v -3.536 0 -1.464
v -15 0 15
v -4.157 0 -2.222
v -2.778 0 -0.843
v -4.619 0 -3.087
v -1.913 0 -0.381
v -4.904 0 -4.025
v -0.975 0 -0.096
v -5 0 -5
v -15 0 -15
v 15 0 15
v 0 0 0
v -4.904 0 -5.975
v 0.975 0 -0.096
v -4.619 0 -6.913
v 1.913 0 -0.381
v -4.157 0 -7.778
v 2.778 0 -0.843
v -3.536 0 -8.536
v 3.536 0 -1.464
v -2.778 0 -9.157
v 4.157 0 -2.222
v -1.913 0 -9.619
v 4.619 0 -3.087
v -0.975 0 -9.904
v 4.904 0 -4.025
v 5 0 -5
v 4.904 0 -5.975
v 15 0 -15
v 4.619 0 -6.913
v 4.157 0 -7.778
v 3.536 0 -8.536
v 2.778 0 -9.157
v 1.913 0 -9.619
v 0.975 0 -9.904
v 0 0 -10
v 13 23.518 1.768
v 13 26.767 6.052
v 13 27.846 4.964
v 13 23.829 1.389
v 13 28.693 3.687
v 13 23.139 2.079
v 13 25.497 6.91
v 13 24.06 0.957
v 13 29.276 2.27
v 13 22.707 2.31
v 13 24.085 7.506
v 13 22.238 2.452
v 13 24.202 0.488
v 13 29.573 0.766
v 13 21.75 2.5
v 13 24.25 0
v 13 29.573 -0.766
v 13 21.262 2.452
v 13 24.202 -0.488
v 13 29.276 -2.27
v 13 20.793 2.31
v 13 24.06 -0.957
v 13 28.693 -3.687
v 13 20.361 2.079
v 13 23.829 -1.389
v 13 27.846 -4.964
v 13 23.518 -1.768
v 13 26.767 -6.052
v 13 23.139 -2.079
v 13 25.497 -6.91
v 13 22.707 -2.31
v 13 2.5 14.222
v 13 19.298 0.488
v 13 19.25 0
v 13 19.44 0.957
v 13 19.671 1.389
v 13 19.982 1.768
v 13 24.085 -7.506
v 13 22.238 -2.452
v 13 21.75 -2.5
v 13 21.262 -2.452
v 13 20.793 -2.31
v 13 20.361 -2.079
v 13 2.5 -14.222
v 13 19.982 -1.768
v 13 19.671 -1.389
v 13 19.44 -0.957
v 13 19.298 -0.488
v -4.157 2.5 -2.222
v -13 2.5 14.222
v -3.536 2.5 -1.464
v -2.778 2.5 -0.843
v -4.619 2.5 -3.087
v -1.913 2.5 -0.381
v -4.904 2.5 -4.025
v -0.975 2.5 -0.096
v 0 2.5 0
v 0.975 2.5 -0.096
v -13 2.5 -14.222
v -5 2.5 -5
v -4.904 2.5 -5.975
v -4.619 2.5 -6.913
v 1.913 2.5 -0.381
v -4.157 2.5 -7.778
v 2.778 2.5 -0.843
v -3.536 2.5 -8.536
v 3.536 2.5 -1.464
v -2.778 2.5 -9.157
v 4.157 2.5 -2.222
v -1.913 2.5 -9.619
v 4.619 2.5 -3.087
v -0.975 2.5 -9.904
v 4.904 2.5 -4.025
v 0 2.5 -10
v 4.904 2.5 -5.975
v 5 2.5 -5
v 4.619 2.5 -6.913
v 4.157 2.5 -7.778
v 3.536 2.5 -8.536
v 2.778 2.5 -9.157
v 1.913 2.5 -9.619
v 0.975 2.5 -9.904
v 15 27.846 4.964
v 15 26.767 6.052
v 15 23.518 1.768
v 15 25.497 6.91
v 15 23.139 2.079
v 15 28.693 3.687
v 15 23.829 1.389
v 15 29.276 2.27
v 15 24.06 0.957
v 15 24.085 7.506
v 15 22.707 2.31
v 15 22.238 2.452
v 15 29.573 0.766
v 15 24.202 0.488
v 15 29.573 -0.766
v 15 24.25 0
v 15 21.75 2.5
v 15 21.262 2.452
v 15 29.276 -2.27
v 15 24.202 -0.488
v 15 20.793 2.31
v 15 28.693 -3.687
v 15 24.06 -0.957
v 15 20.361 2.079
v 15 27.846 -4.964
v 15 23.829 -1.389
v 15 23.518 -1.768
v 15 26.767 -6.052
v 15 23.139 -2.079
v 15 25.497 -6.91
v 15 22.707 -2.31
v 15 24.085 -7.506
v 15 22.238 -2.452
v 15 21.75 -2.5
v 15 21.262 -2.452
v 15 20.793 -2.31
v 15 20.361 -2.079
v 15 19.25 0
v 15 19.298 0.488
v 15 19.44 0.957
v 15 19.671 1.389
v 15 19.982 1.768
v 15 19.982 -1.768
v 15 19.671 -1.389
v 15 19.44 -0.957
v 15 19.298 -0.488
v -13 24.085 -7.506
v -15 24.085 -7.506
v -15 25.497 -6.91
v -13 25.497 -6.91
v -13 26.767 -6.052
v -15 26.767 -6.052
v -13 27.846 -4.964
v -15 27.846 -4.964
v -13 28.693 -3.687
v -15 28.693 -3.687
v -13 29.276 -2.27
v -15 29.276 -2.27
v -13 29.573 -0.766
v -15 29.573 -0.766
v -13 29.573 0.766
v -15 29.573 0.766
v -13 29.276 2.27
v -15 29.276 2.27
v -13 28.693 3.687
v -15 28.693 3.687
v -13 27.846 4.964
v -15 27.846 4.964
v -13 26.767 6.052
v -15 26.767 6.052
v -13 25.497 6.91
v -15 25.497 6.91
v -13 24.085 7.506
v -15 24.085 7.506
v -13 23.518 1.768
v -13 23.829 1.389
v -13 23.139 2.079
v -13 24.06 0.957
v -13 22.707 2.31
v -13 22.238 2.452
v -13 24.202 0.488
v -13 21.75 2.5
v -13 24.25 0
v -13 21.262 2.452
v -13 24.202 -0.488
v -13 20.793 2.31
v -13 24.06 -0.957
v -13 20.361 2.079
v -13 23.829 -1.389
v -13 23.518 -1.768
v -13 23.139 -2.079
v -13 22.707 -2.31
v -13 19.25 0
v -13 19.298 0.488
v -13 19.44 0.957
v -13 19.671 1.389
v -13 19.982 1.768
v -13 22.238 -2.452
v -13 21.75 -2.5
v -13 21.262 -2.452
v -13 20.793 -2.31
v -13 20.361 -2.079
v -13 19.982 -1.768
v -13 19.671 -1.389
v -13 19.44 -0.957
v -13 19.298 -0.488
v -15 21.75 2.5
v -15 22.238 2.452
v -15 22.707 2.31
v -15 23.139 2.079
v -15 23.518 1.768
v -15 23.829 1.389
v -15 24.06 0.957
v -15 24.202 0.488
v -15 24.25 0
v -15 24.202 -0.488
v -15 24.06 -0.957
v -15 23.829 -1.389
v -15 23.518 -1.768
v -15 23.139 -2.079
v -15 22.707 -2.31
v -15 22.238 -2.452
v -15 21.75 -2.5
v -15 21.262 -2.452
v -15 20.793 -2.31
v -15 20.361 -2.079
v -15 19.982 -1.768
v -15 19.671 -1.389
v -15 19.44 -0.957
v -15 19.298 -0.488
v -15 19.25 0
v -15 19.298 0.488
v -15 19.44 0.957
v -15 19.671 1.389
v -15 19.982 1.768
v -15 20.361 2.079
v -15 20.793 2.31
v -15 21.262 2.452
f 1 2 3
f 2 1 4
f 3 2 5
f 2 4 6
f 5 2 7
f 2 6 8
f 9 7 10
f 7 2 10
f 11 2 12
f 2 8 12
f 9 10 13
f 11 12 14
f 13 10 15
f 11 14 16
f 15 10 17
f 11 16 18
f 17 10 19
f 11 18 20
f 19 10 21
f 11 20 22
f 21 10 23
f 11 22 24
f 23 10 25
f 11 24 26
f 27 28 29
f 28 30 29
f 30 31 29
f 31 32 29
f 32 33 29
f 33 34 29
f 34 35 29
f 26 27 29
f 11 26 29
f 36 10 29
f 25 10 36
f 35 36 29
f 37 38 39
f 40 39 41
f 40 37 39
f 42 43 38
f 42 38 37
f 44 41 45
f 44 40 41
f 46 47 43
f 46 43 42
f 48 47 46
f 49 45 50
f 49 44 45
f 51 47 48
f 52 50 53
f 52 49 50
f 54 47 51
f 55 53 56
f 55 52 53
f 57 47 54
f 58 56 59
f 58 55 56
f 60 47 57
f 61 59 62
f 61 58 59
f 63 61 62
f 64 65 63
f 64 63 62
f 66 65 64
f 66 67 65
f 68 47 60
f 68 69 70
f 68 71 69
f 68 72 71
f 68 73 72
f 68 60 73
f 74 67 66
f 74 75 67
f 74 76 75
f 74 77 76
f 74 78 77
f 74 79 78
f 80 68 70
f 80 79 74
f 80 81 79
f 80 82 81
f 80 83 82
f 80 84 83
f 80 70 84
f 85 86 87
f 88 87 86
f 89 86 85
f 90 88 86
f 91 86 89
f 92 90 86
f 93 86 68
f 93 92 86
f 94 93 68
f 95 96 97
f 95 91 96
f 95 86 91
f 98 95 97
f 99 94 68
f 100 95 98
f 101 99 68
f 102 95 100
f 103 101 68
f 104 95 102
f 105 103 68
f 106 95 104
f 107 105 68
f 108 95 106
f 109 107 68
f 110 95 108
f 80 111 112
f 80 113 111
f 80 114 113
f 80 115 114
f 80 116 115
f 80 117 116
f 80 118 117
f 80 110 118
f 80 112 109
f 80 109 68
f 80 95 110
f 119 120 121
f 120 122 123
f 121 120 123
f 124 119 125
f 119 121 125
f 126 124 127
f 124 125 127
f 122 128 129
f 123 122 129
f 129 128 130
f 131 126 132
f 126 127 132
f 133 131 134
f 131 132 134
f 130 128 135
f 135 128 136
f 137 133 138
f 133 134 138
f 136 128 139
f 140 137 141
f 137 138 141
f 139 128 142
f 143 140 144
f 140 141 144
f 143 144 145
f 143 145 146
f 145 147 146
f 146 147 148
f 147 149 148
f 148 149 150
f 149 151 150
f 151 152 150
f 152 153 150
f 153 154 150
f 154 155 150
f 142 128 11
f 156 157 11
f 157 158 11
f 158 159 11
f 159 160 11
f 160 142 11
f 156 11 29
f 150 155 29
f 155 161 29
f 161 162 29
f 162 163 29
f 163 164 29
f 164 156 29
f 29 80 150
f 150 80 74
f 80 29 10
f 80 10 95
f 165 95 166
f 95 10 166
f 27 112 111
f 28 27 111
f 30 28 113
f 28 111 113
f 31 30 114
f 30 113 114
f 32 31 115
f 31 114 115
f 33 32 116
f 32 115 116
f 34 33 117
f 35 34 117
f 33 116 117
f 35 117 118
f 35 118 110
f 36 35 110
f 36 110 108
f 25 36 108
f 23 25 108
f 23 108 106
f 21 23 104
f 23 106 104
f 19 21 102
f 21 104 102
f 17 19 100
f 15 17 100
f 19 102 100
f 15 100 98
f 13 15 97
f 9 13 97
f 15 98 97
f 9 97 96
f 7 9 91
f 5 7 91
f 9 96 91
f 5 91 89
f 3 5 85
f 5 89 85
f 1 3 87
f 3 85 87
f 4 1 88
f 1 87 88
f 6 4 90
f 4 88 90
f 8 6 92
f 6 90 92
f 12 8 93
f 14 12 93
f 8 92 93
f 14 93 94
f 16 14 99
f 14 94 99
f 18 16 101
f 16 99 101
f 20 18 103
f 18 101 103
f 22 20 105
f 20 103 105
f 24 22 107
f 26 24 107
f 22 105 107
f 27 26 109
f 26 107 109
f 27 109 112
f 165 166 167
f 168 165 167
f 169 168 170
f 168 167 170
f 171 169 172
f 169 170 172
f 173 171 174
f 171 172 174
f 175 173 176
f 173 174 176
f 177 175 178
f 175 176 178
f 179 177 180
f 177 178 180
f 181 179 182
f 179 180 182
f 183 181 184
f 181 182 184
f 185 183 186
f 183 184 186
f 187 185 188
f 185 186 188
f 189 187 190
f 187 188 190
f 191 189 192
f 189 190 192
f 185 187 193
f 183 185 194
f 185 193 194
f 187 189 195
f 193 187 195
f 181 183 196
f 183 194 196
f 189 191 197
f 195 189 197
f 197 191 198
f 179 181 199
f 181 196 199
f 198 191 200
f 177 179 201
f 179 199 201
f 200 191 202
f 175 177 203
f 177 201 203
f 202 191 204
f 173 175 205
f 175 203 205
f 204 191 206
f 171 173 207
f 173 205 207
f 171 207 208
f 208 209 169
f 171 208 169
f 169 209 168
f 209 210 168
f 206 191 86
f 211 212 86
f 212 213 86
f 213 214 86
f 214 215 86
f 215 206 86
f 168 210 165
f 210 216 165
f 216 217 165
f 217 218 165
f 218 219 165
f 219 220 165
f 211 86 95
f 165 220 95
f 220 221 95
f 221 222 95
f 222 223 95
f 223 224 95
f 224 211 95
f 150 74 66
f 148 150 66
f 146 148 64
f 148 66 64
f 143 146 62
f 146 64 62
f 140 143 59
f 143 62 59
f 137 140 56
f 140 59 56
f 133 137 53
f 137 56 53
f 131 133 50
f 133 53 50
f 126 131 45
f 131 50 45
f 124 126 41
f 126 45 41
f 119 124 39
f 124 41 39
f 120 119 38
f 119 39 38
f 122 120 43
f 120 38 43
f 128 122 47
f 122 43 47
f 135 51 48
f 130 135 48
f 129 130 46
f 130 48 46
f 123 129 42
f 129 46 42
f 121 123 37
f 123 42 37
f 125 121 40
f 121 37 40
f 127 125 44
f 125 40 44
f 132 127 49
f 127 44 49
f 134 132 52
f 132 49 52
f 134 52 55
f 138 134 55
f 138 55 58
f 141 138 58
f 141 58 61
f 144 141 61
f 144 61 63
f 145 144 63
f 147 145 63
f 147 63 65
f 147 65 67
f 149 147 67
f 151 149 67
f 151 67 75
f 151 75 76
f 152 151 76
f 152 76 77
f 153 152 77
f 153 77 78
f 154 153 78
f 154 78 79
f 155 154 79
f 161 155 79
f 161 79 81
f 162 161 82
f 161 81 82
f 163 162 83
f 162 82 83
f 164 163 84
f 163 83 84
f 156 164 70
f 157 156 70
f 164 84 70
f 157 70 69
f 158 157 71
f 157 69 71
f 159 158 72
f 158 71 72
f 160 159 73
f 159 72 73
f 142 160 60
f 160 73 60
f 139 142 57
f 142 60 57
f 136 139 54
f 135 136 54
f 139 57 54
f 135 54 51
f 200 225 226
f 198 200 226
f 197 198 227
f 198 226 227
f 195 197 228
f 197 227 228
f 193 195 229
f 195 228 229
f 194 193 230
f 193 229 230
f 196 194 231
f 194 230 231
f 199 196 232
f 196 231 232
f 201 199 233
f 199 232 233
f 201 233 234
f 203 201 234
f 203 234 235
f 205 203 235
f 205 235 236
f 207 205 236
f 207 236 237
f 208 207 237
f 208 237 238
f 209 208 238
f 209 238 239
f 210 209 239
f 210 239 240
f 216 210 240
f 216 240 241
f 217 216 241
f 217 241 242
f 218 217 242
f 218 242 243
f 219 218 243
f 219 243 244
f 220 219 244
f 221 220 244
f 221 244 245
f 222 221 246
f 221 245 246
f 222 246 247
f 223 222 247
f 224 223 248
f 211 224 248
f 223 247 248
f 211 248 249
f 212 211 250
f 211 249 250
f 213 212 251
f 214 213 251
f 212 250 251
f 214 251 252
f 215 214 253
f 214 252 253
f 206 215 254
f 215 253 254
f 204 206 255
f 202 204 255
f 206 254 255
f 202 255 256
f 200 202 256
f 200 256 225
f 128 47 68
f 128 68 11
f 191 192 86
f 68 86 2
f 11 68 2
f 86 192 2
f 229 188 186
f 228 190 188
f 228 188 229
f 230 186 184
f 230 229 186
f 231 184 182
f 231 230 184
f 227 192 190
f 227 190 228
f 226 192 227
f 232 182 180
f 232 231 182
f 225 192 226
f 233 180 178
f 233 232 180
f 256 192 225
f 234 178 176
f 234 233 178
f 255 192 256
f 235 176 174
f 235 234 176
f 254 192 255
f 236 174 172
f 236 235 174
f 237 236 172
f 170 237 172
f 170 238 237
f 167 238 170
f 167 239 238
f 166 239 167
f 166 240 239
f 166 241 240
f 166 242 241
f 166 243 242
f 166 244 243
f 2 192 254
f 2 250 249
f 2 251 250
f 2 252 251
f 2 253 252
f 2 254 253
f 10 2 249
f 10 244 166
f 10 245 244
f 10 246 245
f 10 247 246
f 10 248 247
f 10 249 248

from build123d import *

# Parameters (mm, degrees)
SKETCH1_W           = 30
SKETCH1_H           = 30
BOSS_EXTRUDE1_DEPTH = 2.5
SKETCH2_R           = 5
CUT_EXTRUDE1_DEPTH  = 2.5
SKETCH4_W           = 2
SKETCH4_H           = 30
BOSS_EXTRUDE2_DEPTH = 31.75
SKETCH5_R           = 2.5
CUT_EXTRUDE2_DEPTH  = 30.75
CUT_EXTRUDE3_DEPTH  = 30.75


with BuildPart() as part:
    # Sketch1 → Boss-Extrude1 (new body)
    with BuildSketch(Plane(origin=(0, 0, 0), x_dir=(1, 0, 0), z_dir=(0, 1, 0))):
        Rectangle(SKETCH1_W, SKETCH1_H)
    extrude(amount=BOSS_EXTRUDE1_DEPTH)

    # Sketch2 → Cut-Extrude1 (cut)
    with BuildSketch(Plane(origin=(0, 2.5, 0), x_dir=(1, 0, 0), z_dir=(0, 1, 0))):
        with Locations((0, 5)):
            Circle(SKETCH2_R)
    extrude(amount=-CUT_EXTRUDE1_DEPTH, mode=Mode.SUBTRACT)

    # Sketch4 → Boss-Extrude2 (add)
    with BuildSketch(Plane(origin=(0, 2.5, 0), x_dir=(1, 0, 0), z_dir=(0, 1, 0))):
        with Locations((-14, 0)):
            Rectangle(SKETCH4_W, SKETCH4_H)
        with Locations((14, 0)):
            Rectangle(SKETCH4_W, SKETCH4_H)
    extrude(amount=BOSS_EXTRUDE2_DEPTH)

    # Sketch5 → Cut-Extrude2 (cut)
    with BuildSketch(Plane.ZY.offset(15)):
        with Locations((0, 21.75)):
            Circle(SKETCH5_R)
    extrude(amount=-CUT_EXTRUDE2_DEPTH, mode=Mode.SUBTRACT)

    # Sketch6 → Cut-Extrude3 (cut)
    with BuildSketch(Plane.ZY.offset(15)):
        with BuildLine():
            Line((-15, 0), (-7.505901536, 24.085434897))
            ThreePointArc((-7.505901536, 24.085434897), (0, 29.610840542), (7.505901536, 24.085434897))
            Line((7.505901536, 24.085434897), (15, 0))
            Line((15, 0), (15, 34.25))
            Line((15, 34.25), (-15, 34.25))
            Line((-15, 34.25), (-15, 0))
        make_face()
    extrude(amount=-CUT_EXTRUDE3_DEPTH, mode=Mode.SUBTRACT)


solid = part.part
